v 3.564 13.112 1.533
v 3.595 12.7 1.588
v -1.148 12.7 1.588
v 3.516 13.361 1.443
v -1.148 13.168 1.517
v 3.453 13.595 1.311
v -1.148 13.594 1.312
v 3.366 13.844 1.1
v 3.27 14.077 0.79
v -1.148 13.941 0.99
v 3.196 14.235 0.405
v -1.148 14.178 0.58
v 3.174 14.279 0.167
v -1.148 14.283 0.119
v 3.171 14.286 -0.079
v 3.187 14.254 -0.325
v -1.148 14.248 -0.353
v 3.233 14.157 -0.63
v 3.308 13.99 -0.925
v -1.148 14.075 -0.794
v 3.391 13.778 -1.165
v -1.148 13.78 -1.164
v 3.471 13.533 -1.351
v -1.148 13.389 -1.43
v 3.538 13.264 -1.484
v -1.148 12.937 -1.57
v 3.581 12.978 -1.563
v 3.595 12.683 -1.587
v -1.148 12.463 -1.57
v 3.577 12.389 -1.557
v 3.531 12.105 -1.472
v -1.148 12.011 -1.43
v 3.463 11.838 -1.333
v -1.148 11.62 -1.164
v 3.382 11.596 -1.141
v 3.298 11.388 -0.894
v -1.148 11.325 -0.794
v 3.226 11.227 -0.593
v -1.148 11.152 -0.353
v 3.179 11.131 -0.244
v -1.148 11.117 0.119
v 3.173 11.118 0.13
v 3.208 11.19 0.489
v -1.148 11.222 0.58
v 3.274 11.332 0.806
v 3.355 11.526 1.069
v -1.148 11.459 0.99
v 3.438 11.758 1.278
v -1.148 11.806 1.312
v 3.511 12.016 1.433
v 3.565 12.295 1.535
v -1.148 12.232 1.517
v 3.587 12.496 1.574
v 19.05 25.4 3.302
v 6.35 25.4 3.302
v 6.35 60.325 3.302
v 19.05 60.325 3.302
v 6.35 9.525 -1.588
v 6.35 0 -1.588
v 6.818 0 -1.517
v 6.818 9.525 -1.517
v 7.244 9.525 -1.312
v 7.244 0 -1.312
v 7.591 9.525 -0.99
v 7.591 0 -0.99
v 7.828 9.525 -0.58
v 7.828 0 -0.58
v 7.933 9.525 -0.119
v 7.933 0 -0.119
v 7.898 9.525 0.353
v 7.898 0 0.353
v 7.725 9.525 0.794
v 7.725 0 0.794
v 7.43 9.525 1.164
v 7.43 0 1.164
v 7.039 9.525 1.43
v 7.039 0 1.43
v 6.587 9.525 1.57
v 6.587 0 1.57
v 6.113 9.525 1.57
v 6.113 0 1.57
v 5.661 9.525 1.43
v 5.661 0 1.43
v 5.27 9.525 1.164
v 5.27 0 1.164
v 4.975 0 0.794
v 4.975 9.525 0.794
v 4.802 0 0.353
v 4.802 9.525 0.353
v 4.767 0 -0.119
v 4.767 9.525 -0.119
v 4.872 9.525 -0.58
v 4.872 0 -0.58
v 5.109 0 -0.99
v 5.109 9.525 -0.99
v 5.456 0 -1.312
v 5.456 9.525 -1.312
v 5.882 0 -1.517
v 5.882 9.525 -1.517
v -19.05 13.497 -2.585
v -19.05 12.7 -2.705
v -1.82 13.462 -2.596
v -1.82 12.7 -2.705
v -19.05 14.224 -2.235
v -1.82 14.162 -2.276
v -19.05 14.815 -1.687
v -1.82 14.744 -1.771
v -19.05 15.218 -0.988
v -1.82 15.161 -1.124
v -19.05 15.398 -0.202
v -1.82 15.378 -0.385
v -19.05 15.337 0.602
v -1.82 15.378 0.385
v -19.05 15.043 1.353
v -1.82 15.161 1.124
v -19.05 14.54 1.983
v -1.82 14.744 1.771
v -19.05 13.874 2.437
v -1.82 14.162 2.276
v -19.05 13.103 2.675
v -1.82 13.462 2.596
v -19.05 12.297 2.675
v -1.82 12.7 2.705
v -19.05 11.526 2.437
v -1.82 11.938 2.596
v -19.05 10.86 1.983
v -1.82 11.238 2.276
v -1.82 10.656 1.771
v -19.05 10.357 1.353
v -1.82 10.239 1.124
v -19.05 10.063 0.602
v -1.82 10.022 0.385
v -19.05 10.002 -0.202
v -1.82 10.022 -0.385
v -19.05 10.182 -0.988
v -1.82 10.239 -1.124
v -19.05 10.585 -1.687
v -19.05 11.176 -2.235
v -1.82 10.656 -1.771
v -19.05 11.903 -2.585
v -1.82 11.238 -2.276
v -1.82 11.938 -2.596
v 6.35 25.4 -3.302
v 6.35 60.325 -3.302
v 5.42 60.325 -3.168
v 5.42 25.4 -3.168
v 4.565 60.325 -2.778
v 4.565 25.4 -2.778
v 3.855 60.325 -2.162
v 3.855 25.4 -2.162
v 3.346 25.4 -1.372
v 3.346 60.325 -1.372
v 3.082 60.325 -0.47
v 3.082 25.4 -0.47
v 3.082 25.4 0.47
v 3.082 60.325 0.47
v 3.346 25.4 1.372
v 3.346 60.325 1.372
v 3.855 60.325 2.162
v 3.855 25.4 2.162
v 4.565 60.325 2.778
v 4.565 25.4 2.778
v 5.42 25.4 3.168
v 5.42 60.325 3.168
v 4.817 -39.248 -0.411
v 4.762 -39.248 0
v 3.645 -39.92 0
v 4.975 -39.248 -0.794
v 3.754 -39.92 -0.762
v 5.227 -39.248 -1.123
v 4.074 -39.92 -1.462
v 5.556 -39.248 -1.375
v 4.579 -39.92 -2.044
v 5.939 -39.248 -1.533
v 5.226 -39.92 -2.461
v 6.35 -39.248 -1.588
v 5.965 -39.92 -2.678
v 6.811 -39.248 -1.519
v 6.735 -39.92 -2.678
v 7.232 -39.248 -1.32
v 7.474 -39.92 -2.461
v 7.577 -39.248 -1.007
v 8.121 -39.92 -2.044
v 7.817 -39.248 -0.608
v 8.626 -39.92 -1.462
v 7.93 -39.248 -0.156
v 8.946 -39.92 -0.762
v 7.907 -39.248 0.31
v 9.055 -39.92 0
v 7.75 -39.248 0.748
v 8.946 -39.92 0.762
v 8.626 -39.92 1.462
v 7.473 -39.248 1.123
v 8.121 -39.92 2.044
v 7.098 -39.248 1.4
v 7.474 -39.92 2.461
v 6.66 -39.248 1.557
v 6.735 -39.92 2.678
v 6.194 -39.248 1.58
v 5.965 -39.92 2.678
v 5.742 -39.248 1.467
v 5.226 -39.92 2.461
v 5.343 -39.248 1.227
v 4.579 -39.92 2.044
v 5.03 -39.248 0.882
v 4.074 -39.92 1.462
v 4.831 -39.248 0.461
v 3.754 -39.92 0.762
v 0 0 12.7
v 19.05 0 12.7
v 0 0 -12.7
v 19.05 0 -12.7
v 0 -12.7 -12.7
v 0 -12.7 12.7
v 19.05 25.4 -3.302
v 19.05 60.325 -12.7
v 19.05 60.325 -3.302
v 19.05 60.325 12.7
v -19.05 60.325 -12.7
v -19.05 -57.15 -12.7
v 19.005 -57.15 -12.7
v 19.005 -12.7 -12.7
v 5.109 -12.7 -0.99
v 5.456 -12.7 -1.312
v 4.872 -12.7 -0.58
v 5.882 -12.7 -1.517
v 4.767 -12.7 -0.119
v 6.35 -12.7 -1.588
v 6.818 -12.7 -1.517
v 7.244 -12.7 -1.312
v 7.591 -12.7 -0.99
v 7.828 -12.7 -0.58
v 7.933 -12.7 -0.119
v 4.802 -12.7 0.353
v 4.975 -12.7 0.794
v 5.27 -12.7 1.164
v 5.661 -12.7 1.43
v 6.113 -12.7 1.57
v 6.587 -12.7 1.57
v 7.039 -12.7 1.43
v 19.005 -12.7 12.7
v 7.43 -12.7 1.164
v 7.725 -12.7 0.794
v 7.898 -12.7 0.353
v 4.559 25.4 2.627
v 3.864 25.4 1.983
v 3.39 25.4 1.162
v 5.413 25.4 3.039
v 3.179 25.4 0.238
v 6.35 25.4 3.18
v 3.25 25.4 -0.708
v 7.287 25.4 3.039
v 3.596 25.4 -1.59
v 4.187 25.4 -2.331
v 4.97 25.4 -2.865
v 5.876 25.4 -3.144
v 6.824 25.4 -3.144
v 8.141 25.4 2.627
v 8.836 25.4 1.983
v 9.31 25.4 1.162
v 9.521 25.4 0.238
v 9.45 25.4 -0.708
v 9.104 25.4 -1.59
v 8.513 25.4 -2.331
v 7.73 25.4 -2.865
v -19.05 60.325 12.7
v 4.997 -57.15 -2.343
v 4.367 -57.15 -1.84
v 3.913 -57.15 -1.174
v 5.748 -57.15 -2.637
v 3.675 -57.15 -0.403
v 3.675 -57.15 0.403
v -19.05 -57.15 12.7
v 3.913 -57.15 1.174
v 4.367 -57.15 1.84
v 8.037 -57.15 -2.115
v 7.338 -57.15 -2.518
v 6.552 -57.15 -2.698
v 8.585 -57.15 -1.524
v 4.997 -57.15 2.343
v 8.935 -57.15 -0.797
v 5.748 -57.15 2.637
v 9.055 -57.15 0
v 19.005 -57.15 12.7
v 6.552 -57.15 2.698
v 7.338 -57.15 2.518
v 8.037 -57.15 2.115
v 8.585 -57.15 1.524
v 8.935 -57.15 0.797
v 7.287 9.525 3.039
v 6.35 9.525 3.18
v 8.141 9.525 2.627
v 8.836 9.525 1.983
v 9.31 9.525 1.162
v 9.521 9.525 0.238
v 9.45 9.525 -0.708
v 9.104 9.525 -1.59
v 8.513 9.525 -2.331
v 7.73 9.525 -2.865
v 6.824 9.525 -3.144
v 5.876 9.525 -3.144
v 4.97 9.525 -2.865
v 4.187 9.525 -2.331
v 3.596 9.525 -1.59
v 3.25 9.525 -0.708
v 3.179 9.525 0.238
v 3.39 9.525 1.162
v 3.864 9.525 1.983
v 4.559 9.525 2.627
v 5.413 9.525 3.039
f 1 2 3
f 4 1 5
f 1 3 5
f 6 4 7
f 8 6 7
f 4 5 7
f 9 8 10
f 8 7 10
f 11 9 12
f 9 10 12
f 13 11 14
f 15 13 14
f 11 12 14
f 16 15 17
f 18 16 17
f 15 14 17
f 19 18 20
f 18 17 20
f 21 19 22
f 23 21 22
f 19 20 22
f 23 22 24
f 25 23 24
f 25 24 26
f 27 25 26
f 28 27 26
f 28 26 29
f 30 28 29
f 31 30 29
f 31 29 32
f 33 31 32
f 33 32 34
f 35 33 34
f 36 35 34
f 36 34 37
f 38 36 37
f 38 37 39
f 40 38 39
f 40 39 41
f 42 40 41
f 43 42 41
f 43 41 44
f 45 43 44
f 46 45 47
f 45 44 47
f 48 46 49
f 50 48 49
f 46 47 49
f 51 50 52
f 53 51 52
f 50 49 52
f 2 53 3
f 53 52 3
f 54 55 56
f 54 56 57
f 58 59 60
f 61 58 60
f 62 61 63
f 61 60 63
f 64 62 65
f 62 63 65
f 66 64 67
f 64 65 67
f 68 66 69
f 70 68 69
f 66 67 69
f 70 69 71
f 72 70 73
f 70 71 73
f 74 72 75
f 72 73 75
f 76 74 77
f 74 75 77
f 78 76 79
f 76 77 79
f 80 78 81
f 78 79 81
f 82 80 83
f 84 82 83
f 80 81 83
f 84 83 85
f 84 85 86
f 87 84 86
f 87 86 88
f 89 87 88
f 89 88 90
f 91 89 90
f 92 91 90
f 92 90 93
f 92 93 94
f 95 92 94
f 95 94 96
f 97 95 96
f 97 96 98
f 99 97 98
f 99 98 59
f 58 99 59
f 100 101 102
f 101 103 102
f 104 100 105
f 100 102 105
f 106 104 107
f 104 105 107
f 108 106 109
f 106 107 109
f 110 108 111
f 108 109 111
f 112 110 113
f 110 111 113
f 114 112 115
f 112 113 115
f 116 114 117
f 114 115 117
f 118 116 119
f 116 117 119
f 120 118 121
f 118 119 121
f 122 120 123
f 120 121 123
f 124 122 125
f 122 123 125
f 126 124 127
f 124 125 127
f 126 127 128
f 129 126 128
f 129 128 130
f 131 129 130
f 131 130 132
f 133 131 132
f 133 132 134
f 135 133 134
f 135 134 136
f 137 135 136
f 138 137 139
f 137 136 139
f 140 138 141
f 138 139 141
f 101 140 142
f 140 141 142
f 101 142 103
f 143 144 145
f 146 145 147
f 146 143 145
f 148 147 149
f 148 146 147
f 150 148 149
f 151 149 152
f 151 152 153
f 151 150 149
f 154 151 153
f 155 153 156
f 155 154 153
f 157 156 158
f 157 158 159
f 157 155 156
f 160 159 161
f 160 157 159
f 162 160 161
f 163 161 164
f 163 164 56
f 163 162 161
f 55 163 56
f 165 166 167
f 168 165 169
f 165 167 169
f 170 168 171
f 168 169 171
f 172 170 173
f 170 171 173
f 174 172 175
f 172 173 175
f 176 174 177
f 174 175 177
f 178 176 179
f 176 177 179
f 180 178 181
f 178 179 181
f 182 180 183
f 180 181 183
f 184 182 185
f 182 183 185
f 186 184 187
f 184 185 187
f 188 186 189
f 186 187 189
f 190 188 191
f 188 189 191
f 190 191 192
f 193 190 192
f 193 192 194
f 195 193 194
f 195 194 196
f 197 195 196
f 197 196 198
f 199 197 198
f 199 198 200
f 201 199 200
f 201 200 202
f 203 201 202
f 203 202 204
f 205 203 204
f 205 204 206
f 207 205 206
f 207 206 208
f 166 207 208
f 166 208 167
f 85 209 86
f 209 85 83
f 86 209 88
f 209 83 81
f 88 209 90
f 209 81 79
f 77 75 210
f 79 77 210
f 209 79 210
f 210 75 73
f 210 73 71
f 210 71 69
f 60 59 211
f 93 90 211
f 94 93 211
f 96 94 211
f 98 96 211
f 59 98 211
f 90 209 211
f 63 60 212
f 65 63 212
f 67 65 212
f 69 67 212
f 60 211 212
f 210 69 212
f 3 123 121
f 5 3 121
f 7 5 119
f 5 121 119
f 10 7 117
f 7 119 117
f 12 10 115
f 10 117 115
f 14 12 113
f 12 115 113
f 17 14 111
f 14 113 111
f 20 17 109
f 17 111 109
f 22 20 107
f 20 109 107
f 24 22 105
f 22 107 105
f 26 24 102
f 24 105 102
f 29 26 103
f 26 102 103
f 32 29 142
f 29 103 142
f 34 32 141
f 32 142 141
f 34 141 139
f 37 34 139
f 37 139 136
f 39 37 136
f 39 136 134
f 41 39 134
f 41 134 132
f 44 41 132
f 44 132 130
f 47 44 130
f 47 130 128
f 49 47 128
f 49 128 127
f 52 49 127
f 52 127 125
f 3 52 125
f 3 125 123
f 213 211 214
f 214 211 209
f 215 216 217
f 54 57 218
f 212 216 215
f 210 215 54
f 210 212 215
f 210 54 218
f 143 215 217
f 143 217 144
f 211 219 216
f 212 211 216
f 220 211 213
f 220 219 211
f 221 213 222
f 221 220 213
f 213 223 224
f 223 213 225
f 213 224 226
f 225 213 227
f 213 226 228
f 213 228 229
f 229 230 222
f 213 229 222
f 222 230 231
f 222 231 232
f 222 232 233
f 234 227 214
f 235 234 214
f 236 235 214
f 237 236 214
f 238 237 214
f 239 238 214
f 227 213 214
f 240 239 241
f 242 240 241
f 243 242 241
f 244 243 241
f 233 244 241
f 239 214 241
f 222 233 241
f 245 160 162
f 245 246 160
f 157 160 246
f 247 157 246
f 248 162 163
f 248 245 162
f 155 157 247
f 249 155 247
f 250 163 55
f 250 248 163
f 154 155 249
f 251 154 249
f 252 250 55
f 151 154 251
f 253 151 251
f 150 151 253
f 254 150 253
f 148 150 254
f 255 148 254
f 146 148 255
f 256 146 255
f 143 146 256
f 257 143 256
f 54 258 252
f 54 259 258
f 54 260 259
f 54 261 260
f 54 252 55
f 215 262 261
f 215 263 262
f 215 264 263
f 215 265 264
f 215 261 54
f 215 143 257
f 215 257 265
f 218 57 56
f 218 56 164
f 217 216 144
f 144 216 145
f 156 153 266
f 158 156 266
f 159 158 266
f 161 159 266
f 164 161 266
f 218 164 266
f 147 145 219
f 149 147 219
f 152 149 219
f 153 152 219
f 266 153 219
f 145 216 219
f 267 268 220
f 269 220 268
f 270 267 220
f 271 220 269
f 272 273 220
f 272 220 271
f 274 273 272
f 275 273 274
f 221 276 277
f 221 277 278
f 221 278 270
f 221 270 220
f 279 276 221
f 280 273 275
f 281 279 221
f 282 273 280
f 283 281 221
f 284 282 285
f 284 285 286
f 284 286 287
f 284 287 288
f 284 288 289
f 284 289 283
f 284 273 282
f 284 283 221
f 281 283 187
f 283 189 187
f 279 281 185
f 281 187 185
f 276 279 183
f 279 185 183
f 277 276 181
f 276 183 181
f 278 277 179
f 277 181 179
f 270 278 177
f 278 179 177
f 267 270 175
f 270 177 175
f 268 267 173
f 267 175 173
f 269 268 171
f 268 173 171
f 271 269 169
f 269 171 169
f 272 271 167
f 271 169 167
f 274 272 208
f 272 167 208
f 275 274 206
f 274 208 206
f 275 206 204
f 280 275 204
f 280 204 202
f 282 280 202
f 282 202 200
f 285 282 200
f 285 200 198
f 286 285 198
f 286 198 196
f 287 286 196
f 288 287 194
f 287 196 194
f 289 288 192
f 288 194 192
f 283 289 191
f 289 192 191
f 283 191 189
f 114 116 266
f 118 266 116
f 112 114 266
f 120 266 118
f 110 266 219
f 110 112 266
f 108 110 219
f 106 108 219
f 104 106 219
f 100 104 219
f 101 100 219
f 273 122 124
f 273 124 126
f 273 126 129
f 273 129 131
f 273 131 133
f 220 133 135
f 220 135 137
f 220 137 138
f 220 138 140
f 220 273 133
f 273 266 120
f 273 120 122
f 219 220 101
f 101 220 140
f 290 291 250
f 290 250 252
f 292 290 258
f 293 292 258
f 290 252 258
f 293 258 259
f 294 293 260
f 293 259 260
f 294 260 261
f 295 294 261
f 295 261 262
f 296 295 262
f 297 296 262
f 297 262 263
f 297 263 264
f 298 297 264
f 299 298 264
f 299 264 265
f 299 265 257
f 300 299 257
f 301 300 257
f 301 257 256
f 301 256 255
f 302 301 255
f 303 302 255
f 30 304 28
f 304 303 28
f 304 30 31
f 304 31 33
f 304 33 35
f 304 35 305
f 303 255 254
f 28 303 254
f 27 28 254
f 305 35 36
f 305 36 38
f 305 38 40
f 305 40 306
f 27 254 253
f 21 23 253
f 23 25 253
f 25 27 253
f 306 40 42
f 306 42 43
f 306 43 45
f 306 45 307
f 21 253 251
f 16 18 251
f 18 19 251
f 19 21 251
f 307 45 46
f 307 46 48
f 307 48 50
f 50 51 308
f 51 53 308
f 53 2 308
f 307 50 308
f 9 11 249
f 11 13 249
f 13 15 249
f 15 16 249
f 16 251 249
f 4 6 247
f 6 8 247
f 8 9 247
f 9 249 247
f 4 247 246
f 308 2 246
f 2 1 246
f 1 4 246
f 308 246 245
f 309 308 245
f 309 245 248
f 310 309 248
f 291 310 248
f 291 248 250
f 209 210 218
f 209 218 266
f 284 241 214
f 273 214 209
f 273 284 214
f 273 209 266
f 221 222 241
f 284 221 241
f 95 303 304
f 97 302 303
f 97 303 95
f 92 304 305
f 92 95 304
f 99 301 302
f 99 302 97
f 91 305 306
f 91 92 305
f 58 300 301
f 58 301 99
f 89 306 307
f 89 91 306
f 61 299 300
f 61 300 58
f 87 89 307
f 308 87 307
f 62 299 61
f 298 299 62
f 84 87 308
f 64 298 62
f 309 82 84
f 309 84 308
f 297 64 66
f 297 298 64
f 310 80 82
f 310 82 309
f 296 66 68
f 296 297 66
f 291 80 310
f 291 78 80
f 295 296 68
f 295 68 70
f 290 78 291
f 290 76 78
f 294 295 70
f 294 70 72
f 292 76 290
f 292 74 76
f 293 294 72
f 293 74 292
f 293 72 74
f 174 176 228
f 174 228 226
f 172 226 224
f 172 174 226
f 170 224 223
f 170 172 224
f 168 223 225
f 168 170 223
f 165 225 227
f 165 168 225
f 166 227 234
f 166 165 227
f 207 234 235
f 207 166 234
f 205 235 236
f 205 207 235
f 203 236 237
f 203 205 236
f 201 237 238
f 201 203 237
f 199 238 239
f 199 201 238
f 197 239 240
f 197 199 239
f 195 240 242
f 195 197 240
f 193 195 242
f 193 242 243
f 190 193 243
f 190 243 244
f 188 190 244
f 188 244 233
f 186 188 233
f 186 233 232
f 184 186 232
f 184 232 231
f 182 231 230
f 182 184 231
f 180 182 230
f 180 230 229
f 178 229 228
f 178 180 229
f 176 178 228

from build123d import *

# Parameters (mm, degrees)
SKETCH1_W                   = 38.1
SKETCH1_H                   = 25.4
BOSS_EXTRUDE1_DEPTH         = 25.4
SKETCH3_R                   = 1.5875
CUT_EXTRUDE2_DEPTH          = 25.4
F_1_4_28_TAPPED_HOLE1_D     = 5.4102
F_1_4_28_TAPPED_HOLE1_DEPTH = 17.23
F_1_4_28_TAPPED_HOLE1_TIP   = 1.625388061
SKETCH2_R                   = 3.18
CUT_EXTRUDE6_DEPTH          = 15.875
SKETCH8_R                   = 1.5875
CUT_EXTRUDE7_DEPTH          = 35.1957966
SKETCH9_W                   = 19.05
SKETCH9_H                   = 25.4
BOSS_EXTRUDE2_DEPTH         = 12.7
SKETCH12_W                  = 38.05497839
SKETCH12_H                  = 25.4
BOSS_EXTRUDE3_DEPTH         = 44.45
CUT_EXTRUDE8_START          = -44.45
SKETCH14_R                  = 1.5875
CUT_EXTRUDE8_DEPTH          = 44.45
F_1_4_28_TAPPED_HOLE2_D     = 5.4102
F_1_4_28_TAPPED_HOLE2_DEPTH = 17.23
F_1_4_28_TAPPED_HOLE2_TIP   = 1.625388061
BOSS_EXTRUDE6_DEPTH         = 34.925


with BuildPart() as part:
    # Sketch1 → Boss-Extrude1 (new body)
    with BuildSketch(Plane(origin=(0, 0, 0), x_dir=(1, 0, 0), z_dir=(0, 1, 0))):
        Rectangle(SKETCH1_W, SKETCH1_H)
    extrude(amount=BOSS_EXTRUDE1_DEPTH)

    # Sketch3 → Cut-Extrude2 (cut)
    with BuildSketch(Plane.ZY.offset(19.05)):
        with Locations((0, 12.7)):
            Circle(SKETCH3_R)
    extrude(amount=-CUT_EXTRUDE2_DEPTH, mode=Mode.SUBTRACT)

    # 1/4-28 Tapped Hole1
    with Locations(Plane.ZY.offset(19.05)):
        with Locations((0, 12.7)):
            Hole(F_1_4_28_TAPPED_HOLE1_D / 2, depth=F_1_4_28_TAPPED_HOLE1_DEPTH)
            with Locations((0, 0, -(F_1_4_28_TAPPED_HOLE1_DEPTH + F_1_4_28_TAPPED_HOLE1_TIP / 2))):  # 118° drill point
                Cone(0, F_1_4_28_TAPPED_HOLE1_D / 2, F_1_4_28_TAPPED_HOLE1_TIP, mode=Mode.SUBTRACT)

    # Sketch2 → Cut-Extrude6 (cut)
    with BuildSketch(Plane(origin=(0, 25.4, 0), x_dir=(1, 0, 0), z_dir=(0, 1, 0))):
        with Locations(Location((6.35, 0, 0), (0, 0, 270))):
            Circle(SKETCH2_R)
    extrude(amount=-CUT_EXTRUDE6_DEPTH, mode=Mode.SUBTRACT)

    # Sketch8 → Cut-Extrude7 (cut, through all)
    with BuildSketch(Plane.XZ):
        with Locations(Location((6.35, 0, 0), (0, 0, 270))):
            Circle(SKETCH8_R)
    extrude(amount=-CUT_EXTRUDE7_DEPTH, mode=Mode.SUBTRACT)

    # Sketch9 → Boss-Extrude2 (add)
    with BuildSketch(Plane.XZ):
        with Locations((-9.525, 0)):
            Rectangle(SKETCH9_W, SKETCH9_H)
    extrude(amount=BOSS_EXTRUDE2_DEPTH)

    # Sketch12 → Boss-Extrude3 (add)
    with BuildSketch(Plane.XZ.offset(12.7)):
        with Locations((-0.022510805, 0)):
            Rectangle(SKETCH12_W, SKETCH12_H)
    extrude(amount=BOSS_EXTRUDE3_DEPTH)

    # Sketch14 → Cut-Extrude8 (cut)
    with BuildSketch(Plane(origin=(0, -12.7, 0), x_dir=(1, 0, 0), z_dir=(0, 1, 0)).offset(CUT_EXTRUDE8_START)):
        with Locations(Location((6.35, 0, 0), (0, 0, 90))):
            Circle(SKETCH14_R)
    extrude(amount=CUT_EXTRUDE8_DEPTH, mode=Mode.SUBTRACT)

    # 1/4-28 Tapped Hole2
    with Locations(Plane(origin=(0, -57.15, 0), x_dir=(-1, 0, 0), z_dir=(0, -1, 0))):
        with Locations((-6.35, 0)):
            Hole(F_1_4_28_TAPPED_HOLE2_D / 2, depth=F_1_4_28_TAPPED_HOLE2_DEPTH)
            with Locations((0, 0, -(F_1_4_28_TAPPED_HOLE2_DEPTH + F_1_4_28_TAPPED_HOLE2_TIP / 2))):  # 118° drill point
                Cone(0, F_1_4_28_TAPPED_HOLE2_D / 2, F_1_4_28_TAPPED_HOLE2_TIP, mode=Mode.SUBTRACT)

    # Sketch24 → Boss-Extrude6 (add)
    with BuildSketch(Plane(origin=(0, 25.4, 0), x_dir=(1, 0, 0), z_dir=(0, 1, 0))):
        with BuildLine():
            Line((6.35, -3.302), (19.05, -3.302))
            Line((19.05, -3.302), (19.05, -12.7))
            Line((19.05, -12.7), (-19.05, -12.7))
            Line((-19.05, -12.7), (-19.05, 12.7))
            Line((-19.05, 12.7), (19.05, 12.7))
            Line((19.05, 12.7), (19.05, 3.302))
            Line((19.05, 3.302), (6.35, 3.302))
            ThreePointArc((6.35, 3.302), (3.048, 0), (6.35, -3.302))
        make_face()
    extrude(amount=BOSS_EXTRUDE6_DEPTH)


solid = part.part
